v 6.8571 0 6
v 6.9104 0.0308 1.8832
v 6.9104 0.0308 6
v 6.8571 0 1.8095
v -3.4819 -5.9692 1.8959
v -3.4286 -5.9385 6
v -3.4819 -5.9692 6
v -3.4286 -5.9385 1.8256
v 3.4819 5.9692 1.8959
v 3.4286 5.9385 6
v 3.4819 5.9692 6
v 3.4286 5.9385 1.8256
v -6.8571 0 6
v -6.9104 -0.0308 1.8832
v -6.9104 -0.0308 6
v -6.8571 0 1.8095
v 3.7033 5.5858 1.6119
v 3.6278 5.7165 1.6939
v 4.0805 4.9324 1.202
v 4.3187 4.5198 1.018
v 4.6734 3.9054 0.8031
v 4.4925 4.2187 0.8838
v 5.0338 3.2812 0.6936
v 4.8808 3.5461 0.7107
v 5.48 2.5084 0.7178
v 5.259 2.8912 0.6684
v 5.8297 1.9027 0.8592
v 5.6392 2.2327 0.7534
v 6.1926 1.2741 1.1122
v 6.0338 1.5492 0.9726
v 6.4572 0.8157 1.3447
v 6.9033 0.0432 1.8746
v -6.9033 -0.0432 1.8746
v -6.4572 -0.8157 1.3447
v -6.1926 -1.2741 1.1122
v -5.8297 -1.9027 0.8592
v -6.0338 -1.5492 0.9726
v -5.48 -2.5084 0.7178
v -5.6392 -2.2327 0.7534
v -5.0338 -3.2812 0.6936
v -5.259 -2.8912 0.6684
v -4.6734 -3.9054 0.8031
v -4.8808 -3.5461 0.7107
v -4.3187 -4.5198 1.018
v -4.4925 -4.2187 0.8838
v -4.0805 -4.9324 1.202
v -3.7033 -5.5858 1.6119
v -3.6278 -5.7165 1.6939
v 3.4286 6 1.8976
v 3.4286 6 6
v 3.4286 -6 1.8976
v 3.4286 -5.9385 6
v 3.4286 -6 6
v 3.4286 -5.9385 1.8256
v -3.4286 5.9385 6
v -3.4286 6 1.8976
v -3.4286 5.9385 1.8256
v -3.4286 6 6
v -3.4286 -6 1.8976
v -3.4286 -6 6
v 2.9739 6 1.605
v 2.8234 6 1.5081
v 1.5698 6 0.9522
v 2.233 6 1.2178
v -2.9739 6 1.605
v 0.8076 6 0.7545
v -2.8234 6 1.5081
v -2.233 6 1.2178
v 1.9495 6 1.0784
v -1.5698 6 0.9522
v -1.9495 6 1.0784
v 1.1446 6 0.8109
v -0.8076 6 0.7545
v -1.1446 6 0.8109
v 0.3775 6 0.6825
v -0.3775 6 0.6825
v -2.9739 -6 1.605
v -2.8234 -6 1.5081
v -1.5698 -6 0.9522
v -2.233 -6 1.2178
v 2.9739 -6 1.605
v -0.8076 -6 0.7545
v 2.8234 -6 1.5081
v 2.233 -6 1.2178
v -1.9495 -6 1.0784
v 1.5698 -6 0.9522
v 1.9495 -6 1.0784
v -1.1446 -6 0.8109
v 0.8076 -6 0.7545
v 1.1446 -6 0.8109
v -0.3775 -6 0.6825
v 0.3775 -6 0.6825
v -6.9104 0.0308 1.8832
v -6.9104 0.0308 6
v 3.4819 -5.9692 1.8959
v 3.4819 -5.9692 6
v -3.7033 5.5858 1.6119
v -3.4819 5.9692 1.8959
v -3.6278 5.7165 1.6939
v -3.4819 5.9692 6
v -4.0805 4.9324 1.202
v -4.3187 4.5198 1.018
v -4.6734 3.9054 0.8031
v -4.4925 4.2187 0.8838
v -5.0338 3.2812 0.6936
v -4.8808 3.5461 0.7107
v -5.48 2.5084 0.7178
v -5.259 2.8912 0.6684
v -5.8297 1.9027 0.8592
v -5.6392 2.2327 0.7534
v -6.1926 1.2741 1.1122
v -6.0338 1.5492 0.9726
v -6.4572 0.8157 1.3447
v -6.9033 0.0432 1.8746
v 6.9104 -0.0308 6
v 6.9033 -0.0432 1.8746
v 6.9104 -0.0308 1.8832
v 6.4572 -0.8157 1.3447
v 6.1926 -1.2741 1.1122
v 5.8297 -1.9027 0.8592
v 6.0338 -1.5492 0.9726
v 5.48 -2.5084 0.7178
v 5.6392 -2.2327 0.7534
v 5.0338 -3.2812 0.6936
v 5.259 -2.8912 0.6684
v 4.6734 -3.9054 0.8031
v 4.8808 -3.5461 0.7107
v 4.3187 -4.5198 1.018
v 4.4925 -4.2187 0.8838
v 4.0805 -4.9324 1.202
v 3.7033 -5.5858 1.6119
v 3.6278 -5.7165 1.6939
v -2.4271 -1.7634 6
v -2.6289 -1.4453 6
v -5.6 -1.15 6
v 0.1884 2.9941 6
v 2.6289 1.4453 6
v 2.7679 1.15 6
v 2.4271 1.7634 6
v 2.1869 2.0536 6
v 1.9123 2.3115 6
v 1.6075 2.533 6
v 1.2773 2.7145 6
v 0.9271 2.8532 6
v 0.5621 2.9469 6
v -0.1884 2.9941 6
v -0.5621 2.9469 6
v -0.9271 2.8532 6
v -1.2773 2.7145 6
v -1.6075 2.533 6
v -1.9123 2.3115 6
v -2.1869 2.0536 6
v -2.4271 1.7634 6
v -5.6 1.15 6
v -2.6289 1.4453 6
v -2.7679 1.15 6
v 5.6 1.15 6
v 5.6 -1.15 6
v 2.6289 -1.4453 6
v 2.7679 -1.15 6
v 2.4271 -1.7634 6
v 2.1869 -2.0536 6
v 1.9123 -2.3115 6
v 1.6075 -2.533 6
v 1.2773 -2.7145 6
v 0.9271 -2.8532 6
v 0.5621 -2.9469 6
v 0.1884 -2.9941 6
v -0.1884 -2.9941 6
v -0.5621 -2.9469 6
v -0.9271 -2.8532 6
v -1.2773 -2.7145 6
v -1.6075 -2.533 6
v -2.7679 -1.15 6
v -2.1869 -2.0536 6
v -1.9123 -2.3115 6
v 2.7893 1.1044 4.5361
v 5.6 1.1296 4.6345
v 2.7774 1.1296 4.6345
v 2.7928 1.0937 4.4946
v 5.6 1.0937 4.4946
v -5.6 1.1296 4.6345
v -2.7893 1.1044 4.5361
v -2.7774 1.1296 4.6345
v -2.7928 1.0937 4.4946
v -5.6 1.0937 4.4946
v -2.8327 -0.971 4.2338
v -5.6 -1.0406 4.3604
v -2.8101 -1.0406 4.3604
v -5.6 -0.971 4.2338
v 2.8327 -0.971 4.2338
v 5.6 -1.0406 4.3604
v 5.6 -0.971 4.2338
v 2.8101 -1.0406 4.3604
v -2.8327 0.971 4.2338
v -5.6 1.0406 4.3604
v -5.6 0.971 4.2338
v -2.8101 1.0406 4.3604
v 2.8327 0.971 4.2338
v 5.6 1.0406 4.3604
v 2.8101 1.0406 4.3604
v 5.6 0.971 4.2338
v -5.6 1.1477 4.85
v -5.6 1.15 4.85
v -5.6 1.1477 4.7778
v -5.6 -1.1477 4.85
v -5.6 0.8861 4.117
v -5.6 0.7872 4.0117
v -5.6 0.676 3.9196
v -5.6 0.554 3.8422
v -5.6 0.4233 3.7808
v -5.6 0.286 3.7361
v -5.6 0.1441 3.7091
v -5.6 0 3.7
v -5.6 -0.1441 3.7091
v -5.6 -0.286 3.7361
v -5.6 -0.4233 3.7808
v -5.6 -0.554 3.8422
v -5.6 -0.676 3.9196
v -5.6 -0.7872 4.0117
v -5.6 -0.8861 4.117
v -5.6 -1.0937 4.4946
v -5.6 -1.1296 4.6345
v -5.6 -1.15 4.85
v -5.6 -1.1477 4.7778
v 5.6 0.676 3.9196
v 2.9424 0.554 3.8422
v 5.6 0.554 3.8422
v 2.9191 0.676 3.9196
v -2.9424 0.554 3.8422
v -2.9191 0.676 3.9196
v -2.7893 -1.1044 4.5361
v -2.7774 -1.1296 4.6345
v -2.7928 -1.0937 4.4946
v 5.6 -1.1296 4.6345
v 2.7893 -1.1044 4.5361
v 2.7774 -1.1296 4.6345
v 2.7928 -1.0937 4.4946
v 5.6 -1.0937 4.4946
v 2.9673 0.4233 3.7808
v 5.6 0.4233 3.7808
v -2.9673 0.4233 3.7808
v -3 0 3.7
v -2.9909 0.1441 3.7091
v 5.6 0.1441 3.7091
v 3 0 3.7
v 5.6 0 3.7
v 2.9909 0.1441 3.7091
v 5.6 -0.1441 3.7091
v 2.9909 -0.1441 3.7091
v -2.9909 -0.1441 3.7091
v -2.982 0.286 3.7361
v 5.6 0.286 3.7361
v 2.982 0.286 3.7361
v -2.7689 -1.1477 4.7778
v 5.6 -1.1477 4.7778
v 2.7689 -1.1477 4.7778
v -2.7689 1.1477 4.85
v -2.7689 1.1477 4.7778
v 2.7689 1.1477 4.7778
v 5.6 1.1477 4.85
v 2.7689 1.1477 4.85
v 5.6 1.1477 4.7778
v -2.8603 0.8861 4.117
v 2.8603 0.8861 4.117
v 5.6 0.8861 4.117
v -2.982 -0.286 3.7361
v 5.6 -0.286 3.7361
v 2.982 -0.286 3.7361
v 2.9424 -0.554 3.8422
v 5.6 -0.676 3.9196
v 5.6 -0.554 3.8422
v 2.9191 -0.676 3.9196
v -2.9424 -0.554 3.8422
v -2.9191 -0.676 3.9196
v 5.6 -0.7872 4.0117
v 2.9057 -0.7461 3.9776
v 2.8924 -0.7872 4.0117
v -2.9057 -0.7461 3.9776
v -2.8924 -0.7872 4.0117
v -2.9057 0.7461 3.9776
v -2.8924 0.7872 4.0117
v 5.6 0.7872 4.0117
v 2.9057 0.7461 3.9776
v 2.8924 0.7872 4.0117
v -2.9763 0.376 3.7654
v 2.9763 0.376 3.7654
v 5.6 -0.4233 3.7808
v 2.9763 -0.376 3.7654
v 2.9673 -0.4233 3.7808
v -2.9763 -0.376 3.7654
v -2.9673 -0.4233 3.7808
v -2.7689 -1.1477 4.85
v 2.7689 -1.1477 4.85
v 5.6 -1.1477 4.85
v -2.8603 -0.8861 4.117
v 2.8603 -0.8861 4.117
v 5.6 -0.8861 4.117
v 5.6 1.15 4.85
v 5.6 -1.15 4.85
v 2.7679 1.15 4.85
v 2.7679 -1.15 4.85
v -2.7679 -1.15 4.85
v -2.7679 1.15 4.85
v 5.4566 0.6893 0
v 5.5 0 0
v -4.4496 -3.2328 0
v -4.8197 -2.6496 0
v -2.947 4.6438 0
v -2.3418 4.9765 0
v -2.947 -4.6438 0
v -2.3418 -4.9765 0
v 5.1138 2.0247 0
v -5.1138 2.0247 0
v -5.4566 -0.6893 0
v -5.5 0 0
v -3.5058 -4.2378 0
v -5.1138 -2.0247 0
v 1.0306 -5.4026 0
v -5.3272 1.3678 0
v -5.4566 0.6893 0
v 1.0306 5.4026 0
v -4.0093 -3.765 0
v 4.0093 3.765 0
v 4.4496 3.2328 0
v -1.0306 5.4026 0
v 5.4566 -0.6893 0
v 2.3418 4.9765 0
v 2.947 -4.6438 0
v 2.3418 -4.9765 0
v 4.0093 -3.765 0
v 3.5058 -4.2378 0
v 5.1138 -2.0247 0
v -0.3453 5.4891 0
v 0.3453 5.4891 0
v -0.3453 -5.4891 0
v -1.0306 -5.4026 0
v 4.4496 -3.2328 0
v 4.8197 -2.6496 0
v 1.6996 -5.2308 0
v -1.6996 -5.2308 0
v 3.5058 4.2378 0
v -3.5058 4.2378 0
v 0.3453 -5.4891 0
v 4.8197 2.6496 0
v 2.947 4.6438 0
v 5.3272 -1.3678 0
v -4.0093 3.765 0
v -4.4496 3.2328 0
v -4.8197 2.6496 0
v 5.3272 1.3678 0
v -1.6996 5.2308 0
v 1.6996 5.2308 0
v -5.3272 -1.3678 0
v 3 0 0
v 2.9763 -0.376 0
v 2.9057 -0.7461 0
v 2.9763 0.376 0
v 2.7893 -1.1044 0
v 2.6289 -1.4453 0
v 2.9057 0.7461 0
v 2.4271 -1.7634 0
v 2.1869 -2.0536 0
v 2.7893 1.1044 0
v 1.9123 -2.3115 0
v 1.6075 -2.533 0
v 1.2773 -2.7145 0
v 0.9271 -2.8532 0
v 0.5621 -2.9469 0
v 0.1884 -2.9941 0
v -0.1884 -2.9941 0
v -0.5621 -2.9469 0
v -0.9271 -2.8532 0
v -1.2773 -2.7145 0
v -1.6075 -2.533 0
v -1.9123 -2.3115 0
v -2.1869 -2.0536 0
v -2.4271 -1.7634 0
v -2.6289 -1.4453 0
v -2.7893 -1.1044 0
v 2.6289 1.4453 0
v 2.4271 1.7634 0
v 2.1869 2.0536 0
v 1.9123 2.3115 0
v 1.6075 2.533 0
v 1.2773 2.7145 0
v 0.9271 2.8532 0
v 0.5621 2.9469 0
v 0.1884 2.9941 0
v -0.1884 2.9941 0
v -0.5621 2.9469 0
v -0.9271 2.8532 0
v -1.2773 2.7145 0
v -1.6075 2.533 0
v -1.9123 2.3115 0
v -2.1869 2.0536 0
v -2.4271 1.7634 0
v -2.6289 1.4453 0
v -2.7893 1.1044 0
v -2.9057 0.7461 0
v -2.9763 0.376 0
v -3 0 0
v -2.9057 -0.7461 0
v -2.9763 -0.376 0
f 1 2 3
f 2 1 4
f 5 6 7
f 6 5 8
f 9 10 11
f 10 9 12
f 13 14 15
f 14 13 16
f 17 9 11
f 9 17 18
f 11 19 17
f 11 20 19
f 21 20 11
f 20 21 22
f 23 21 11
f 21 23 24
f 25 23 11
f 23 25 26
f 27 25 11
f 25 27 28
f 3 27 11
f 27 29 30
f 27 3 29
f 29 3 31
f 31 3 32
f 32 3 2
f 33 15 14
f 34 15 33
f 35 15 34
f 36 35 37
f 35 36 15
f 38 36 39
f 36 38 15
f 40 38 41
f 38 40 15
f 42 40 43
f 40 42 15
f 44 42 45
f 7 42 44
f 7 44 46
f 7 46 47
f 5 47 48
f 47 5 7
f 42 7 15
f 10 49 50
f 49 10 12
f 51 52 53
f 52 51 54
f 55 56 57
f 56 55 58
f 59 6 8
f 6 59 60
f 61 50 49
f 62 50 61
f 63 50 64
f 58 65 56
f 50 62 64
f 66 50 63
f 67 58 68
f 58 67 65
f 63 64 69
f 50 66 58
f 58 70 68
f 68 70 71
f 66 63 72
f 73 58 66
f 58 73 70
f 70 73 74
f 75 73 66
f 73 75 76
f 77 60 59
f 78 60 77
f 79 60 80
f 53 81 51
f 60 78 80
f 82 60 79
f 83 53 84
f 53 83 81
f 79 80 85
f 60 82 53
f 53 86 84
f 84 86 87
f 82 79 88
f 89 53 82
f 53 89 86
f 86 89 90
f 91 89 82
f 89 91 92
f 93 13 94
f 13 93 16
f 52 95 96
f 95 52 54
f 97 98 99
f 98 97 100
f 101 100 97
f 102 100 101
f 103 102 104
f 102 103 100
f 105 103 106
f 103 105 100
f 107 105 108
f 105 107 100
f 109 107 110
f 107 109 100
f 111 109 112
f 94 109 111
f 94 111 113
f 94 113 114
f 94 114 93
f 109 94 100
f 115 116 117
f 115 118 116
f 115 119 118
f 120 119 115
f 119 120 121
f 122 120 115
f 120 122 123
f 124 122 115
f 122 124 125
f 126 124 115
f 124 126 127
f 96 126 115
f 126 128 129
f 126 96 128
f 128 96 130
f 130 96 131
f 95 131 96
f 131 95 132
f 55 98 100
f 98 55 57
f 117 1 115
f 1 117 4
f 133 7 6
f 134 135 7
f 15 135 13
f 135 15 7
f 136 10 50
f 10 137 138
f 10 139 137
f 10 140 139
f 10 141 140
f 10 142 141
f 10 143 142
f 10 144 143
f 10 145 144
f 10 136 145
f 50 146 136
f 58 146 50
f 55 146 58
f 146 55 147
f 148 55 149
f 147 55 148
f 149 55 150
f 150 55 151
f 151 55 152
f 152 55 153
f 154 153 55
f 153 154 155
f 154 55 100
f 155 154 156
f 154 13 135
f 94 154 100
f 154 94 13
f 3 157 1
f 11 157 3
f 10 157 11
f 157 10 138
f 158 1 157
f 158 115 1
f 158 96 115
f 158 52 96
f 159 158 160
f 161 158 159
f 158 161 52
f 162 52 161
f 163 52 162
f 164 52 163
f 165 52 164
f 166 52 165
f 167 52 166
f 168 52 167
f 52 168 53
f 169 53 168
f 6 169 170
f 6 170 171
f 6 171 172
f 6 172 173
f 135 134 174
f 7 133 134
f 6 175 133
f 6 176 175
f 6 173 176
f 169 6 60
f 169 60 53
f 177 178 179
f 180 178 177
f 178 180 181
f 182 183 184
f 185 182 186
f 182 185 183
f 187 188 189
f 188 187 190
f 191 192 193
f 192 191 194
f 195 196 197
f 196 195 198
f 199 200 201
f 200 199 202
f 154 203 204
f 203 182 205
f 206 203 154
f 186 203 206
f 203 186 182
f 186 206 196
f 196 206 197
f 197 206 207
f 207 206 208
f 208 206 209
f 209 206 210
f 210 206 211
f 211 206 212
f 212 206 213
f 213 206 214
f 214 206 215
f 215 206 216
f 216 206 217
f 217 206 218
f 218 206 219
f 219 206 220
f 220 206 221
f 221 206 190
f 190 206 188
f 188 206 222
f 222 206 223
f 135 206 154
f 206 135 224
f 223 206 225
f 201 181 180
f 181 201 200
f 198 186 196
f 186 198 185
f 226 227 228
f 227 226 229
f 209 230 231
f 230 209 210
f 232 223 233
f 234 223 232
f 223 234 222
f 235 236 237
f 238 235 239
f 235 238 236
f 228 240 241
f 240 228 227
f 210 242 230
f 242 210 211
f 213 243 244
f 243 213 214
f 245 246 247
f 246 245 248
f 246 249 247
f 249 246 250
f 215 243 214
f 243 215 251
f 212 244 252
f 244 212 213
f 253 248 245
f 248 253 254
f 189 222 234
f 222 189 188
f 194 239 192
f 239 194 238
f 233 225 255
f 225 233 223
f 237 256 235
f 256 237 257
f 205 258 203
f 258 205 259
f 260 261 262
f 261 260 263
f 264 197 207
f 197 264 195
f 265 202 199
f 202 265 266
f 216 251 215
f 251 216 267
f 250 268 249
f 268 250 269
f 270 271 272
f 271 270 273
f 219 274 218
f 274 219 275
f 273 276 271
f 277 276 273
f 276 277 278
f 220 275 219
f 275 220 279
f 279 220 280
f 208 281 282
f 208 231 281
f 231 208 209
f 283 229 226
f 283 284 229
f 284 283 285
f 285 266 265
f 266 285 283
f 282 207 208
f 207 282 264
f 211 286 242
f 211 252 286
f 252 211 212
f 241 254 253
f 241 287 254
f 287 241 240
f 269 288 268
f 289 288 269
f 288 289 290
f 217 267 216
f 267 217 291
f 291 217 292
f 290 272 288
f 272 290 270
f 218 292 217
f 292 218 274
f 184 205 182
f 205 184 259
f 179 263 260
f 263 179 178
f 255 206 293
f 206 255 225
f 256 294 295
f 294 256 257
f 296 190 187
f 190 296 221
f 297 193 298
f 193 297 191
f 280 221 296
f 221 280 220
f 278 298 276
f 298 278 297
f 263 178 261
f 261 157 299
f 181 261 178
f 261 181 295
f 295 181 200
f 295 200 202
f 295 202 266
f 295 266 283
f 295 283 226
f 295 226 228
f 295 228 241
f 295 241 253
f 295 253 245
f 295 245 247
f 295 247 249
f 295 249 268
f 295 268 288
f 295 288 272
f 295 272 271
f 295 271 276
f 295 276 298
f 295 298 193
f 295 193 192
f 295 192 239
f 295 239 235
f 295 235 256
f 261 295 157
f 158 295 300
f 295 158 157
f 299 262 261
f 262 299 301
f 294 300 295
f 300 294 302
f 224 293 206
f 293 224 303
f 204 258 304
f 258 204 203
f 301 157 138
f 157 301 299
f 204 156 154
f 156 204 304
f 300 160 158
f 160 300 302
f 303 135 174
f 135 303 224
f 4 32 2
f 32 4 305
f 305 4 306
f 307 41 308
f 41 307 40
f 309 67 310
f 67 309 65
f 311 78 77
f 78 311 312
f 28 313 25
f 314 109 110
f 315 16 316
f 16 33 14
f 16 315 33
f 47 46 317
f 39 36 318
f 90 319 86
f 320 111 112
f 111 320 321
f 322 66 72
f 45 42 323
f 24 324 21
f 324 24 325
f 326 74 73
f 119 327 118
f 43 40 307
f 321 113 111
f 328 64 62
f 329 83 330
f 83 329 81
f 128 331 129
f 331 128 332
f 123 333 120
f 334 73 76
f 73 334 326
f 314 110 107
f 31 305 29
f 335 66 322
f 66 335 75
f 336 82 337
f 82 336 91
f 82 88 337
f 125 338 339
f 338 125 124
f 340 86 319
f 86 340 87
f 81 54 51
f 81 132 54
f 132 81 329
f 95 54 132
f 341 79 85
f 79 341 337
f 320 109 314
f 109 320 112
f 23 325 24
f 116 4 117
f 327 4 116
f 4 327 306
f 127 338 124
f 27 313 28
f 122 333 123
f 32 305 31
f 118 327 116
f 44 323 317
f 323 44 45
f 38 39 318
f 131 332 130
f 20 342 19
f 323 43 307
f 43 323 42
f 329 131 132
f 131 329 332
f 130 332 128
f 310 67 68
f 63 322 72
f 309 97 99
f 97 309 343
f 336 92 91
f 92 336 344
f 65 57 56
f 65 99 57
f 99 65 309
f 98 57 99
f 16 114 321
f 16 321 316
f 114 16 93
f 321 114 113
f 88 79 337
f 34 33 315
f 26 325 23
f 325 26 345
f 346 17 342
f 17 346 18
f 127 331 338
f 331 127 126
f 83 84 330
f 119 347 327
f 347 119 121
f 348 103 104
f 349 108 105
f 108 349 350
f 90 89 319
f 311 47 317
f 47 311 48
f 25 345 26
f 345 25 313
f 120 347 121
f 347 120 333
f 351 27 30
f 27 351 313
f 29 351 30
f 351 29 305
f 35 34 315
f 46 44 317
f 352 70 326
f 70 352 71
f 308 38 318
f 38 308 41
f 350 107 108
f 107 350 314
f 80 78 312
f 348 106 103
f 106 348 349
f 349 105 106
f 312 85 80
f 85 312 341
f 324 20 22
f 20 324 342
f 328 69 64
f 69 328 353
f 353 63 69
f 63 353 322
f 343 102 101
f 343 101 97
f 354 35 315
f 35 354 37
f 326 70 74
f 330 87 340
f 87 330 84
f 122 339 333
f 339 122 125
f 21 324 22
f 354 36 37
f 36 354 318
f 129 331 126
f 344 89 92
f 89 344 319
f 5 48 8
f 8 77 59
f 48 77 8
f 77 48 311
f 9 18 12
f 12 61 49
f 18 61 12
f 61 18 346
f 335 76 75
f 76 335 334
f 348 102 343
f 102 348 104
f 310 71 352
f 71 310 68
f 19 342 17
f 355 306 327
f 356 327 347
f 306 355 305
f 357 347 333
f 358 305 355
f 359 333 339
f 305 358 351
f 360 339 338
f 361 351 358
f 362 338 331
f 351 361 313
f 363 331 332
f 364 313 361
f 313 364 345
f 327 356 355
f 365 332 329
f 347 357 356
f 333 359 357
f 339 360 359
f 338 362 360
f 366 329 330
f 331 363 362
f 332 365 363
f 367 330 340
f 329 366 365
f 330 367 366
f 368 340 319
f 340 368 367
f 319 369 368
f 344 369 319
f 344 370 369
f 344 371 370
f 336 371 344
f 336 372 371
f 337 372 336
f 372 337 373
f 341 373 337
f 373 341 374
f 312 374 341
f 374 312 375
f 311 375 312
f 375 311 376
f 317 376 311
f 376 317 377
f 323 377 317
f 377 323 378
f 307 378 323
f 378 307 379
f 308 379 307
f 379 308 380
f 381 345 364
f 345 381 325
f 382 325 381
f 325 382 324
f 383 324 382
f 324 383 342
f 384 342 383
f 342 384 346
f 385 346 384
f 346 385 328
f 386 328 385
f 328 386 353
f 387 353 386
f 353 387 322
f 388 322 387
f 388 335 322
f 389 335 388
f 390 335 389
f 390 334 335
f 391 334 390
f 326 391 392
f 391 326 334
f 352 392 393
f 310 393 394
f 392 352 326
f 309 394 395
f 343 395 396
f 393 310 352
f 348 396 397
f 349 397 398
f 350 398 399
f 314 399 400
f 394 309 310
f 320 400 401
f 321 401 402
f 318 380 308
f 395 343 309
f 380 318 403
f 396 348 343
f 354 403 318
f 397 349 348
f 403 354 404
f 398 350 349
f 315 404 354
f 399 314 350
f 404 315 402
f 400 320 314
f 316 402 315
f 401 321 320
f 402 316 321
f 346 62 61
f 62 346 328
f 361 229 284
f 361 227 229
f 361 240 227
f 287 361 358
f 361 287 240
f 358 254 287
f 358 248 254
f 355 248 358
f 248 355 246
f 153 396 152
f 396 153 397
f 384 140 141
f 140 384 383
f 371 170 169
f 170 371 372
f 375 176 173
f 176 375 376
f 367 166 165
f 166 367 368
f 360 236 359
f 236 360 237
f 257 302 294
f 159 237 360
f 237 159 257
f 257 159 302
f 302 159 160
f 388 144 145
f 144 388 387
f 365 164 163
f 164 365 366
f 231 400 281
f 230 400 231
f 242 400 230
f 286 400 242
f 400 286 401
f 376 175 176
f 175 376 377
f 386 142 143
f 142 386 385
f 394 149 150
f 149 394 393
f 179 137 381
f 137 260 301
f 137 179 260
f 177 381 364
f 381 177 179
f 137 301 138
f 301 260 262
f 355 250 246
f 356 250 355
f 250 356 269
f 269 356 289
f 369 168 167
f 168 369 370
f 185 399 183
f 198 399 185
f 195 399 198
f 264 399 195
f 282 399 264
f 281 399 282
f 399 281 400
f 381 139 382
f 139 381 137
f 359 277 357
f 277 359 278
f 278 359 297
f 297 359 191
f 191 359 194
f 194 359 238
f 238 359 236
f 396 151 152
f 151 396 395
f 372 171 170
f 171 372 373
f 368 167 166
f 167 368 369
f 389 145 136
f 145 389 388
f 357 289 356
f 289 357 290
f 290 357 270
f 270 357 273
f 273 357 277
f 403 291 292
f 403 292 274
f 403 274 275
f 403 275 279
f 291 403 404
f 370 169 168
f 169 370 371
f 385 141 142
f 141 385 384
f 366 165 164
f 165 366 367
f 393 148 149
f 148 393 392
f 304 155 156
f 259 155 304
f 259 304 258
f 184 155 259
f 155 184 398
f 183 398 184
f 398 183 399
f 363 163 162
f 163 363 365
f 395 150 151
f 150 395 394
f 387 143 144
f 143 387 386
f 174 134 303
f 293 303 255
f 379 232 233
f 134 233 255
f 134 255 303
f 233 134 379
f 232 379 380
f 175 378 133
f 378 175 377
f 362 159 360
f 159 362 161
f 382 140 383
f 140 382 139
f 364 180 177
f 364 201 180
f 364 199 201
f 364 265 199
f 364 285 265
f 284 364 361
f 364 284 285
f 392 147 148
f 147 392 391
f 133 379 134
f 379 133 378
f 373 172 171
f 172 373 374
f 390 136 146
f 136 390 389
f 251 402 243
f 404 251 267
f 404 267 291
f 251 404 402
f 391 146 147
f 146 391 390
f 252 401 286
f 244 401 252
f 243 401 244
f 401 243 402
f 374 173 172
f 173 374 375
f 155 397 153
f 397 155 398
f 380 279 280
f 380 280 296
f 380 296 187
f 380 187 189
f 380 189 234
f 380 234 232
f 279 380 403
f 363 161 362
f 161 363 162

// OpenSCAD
include <MCAD/shapes.scad>;

$fn = 50;	// rounded edge quality (# of faces per 360 degrees)

hex_mm = 12;		// adjust hex size, default 12
// HEX PART HEIGHT -- MODIFY THIS!
hex_height = 6;	// adjust your rim offset, default 6
pin_depth = 2.3;	// adjust for deeper or shallower pin engagement depth, default 2.3
pin_length = 11.2;	// length of axle pin, default 11.2
pin_width = 2.3;	// width of axle pin, default 2.3
axle_hole = 3;		// axle hole diameter, default 3
flare_height = 2;	// flare lead-in up the side of the hex body, default 2

difference(){	// put hole all the way through
	union(){	// combine fillet shape (base) with rest of hex body
		difference(){	// cut rectangular slot from hex body
			translate([0,0,(hex_height-flare_height-((hex_height-6)/2))]) hexagon(hex_mm,(hex_height-flare_height));	// 12mm hex
			 translate([0,0,(hex_height-(pin_depth/2))]) rotate([90,90,90]) cylinder(pin_length,(pin_depth/2),(pin_depth/2), center = true);	// pin cut-out cylinder
			 translate([(pin_length/2*-1),(pin_width/2*-1),(hex_height-(pin_depth/2))]) cube(size=[pin_length,pin_width,pin_depth+1], center = false);	// pin cut-out rectangle
		}
		difference(){	// clear anything extending beyond hex_mm size
			cylinder(flare_height,5.5,7);	// flared-out cylinder to create fillet
			difference(){	// chop off extra bits of flared-out cylinder
				hexagon((hex_mm+3),(flare_height*2));	// hex "od"
				hexagon(hex_mm,(flare_height*2));		// hex "id"
				}
		}
	}
	cylinder(hex_height,axle_hole,axle_hole);
}
